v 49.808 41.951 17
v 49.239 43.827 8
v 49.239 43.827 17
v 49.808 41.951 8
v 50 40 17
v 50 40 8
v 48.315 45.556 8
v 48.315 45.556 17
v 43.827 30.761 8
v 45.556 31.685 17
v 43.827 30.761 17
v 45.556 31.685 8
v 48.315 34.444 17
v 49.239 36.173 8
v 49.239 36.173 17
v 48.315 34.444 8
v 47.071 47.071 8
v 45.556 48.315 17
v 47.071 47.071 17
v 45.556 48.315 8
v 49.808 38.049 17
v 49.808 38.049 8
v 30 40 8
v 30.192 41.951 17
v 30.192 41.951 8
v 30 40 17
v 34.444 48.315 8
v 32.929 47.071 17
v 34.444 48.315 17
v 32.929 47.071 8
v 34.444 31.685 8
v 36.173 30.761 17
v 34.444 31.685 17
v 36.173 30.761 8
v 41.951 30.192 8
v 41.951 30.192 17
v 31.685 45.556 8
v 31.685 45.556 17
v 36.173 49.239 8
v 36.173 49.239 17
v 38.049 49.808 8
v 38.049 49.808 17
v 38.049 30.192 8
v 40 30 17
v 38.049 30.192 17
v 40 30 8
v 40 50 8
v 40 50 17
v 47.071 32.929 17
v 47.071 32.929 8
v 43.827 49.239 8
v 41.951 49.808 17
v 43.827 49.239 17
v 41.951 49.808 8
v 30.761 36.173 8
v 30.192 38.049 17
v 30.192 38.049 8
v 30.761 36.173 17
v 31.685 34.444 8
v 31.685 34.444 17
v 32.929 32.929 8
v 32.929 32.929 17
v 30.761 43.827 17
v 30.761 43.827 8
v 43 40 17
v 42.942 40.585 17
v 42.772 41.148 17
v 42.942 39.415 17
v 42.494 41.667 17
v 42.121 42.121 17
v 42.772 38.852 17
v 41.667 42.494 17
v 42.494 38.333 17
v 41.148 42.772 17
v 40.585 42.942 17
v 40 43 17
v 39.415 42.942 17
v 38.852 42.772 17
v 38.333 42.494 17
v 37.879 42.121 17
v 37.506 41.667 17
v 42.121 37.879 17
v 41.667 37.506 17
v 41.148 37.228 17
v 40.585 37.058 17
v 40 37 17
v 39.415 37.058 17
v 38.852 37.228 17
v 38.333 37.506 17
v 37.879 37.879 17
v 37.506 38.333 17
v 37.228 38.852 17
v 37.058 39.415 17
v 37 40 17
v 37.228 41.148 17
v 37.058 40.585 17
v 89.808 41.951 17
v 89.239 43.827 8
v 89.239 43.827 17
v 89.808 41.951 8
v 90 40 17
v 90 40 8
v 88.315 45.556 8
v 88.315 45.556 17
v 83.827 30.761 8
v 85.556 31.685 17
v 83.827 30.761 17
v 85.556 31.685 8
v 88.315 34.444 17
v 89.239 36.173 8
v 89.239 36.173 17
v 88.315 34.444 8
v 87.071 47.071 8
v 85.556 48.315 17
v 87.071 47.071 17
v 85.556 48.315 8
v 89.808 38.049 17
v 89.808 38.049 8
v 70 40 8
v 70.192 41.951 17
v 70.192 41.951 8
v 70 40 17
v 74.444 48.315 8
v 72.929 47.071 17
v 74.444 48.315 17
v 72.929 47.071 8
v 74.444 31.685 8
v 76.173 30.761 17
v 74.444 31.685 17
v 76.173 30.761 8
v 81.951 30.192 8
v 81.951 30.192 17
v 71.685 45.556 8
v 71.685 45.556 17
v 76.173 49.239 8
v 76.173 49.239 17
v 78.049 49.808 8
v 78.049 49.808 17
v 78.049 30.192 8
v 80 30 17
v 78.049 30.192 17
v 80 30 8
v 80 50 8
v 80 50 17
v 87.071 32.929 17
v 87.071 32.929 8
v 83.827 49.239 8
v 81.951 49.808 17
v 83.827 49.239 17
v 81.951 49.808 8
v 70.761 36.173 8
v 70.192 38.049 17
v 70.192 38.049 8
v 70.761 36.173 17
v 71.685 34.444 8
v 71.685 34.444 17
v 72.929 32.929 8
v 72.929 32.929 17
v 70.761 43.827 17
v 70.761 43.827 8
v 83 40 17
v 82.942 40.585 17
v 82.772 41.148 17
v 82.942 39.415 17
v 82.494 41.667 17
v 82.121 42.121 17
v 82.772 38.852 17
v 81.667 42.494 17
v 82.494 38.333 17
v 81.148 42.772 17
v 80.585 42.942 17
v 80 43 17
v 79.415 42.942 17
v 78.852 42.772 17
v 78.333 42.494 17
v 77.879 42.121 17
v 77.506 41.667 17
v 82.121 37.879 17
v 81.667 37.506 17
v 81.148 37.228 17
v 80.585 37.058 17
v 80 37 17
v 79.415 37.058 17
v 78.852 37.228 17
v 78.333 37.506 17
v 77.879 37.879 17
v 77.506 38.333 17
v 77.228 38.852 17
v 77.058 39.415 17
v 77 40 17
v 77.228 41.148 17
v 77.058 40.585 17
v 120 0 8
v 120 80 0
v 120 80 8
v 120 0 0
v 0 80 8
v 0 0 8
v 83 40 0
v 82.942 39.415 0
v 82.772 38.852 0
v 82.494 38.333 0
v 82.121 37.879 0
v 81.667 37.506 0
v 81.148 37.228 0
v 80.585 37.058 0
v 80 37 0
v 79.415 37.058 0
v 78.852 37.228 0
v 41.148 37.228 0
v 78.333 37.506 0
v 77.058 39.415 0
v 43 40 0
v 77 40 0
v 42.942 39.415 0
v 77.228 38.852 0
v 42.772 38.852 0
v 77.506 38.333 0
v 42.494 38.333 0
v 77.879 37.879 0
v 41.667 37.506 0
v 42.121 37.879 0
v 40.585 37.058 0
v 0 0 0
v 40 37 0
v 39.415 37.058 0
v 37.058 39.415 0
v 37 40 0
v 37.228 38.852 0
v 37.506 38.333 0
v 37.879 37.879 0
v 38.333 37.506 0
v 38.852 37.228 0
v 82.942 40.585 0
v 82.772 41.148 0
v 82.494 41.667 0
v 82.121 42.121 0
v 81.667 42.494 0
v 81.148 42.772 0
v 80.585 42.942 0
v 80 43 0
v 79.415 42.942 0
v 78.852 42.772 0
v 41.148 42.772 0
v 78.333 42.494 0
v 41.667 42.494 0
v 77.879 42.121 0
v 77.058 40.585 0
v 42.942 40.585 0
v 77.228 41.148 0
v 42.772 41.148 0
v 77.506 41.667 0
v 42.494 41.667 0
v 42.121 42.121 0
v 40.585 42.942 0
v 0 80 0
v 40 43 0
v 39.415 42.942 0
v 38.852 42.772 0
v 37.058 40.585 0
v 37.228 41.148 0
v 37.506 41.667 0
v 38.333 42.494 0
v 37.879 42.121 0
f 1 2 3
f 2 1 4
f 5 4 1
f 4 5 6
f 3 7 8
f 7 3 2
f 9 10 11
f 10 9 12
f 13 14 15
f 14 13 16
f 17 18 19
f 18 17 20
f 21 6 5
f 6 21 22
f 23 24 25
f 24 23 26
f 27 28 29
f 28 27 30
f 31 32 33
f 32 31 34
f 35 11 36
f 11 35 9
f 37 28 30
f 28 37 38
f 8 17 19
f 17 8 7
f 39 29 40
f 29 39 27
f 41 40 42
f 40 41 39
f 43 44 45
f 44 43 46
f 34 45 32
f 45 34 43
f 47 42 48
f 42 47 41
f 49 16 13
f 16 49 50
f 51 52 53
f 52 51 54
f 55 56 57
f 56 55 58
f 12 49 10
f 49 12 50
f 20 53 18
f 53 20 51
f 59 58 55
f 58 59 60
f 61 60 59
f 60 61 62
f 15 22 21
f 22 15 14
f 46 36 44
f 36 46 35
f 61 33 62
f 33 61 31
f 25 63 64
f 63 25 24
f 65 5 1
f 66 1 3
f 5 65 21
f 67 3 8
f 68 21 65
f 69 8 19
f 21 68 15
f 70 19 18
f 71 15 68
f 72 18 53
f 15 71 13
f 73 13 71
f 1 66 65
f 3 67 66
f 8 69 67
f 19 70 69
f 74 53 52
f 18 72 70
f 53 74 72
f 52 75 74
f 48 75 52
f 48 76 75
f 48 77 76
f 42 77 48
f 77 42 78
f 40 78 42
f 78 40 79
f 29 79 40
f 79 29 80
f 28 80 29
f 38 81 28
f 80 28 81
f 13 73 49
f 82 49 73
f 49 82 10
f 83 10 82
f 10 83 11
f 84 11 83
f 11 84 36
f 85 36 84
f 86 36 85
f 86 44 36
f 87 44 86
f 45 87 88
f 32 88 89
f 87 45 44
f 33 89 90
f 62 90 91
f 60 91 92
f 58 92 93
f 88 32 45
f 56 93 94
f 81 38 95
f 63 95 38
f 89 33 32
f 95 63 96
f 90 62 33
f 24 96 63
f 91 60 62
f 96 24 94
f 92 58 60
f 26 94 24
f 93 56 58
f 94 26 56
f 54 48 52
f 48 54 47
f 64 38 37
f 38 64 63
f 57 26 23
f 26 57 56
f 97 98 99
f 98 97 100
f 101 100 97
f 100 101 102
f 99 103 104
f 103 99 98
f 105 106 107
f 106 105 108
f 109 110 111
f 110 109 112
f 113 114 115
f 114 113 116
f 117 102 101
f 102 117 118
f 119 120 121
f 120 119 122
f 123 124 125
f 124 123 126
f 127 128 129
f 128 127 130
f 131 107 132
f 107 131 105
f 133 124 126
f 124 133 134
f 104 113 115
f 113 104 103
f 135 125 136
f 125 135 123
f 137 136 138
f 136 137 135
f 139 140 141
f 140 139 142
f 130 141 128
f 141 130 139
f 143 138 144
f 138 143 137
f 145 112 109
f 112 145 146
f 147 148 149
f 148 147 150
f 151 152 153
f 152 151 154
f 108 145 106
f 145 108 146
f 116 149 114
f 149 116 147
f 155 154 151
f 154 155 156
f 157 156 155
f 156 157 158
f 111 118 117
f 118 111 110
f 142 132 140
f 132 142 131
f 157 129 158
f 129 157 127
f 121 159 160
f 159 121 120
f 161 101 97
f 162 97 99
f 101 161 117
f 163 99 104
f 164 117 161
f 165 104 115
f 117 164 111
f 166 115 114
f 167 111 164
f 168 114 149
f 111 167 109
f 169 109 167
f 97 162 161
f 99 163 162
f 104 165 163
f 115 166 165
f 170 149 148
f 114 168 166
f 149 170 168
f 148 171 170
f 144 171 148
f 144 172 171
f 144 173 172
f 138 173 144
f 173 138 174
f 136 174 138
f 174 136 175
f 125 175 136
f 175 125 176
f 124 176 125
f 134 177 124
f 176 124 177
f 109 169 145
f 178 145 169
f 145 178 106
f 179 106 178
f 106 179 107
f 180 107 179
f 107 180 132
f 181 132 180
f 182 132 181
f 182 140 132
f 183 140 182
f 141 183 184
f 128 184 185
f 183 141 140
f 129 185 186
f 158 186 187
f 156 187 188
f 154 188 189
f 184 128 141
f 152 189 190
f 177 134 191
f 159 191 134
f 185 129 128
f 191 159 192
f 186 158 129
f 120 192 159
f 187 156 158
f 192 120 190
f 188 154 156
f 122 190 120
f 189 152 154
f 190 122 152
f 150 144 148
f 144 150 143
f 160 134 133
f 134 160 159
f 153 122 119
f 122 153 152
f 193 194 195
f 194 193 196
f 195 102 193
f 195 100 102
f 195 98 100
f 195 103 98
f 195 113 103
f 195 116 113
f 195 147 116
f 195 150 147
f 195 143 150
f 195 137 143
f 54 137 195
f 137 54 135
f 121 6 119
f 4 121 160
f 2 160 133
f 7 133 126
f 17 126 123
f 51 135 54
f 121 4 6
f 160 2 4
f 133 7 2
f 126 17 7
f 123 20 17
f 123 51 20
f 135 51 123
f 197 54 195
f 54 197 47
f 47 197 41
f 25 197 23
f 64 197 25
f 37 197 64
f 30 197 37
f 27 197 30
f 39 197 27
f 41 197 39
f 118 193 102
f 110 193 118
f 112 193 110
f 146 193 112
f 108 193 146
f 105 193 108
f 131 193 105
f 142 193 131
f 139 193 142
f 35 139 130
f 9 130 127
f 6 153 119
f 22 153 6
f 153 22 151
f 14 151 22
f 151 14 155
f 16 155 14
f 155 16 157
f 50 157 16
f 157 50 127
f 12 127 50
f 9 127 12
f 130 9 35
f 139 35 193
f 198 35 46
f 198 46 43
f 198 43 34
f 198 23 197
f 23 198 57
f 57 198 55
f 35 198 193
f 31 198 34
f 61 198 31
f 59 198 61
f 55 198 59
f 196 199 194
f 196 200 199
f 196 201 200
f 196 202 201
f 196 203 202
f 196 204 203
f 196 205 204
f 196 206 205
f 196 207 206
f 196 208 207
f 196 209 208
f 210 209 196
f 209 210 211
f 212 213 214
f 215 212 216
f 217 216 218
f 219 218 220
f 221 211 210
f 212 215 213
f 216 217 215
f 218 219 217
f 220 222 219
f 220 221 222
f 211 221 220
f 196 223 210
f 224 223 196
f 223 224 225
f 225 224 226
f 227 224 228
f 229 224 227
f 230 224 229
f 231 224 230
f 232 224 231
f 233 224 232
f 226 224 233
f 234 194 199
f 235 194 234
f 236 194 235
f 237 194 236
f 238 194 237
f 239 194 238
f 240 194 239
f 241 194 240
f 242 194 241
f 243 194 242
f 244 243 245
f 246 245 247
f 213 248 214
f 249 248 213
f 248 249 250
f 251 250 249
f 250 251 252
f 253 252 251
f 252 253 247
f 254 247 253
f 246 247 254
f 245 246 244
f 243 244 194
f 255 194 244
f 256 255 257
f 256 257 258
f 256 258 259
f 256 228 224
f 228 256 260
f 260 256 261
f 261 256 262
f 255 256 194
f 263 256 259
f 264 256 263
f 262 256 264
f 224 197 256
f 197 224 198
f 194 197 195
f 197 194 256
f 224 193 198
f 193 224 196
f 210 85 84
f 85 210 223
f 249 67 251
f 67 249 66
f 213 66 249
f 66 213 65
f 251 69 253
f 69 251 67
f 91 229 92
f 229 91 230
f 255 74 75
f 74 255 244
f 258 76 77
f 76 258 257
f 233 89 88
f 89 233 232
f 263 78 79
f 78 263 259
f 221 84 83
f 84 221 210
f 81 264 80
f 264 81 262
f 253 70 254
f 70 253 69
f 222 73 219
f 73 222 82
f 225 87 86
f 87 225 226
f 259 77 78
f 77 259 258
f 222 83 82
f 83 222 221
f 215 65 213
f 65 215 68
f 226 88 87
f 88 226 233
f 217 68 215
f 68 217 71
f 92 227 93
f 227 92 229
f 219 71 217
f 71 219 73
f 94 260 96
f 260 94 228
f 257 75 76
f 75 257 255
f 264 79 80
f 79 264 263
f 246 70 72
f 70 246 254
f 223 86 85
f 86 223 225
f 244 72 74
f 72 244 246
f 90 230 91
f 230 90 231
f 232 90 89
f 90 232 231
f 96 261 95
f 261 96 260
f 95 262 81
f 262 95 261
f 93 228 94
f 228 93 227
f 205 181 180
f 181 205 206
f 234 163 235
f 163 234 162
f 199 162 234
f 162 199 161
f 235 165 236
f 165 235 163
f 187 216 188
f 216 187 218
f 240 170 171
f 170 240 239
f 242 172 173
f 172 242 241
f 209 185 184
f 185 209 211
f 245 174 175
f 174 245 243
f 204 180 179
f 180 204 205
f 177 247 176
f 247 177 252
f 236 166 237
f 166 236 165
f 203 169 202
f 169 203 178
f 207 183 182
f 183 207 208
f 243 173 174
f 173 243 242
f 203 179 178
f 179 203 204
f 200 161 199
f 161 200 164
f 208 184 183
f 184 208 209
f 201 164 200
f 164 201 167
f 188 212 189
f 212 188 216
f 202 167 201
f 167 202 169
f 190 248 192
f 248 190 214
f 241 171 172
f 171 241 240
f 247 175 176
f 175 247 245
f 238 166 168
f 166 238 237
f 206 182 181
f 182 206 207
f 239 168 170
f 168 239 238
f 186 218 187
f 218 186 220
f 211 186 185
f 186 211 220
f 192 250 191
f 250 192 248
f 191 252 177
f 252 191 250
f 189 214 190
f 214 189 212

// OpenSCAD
$fn = 32;

// ----------------------------------------------------------------------
// Drill jig: two_boss jig
// ----------------------------------------------------------------------

// --- parameters (mm) ---
plate_l = 120;            // plate length, X
plate_w = 80;             // plate width, Y
plate_t = 8;              // plate thickness
boss_d = 20;              // guide boss diameter
boss_h = 10;              // boss height above the plate
guide_d = 6;              // guide hole diameter
boss_pitch = 40;          // boss pitch

n_boss = 2;  // guide bosses
boss_x0 = (plate_l - (n_boss - 1) * boss_pitch) / 2;  // first boss X
boss_top = plate_t - 1 + boss_h;  // boss crown height
total_h = boss_top;  // overall height

difference() {
  union() {
  cube([plate_l, plate_w, plate_t]);
  for (i = [0 : n_boss - 1])
    translate([boss_x0 + i * boss_pitch, plate_w / 2, plate_t - 1])
      cylinder(h = boss_h, d = boss_d);
  }
  for (i = [0 : n_boss - 1])
    translate([boss_x0 + i * boss_pitch, plate_w / 2, -1])
      cylinder(h = plate_t + boss_h, d = guide_d);
}
